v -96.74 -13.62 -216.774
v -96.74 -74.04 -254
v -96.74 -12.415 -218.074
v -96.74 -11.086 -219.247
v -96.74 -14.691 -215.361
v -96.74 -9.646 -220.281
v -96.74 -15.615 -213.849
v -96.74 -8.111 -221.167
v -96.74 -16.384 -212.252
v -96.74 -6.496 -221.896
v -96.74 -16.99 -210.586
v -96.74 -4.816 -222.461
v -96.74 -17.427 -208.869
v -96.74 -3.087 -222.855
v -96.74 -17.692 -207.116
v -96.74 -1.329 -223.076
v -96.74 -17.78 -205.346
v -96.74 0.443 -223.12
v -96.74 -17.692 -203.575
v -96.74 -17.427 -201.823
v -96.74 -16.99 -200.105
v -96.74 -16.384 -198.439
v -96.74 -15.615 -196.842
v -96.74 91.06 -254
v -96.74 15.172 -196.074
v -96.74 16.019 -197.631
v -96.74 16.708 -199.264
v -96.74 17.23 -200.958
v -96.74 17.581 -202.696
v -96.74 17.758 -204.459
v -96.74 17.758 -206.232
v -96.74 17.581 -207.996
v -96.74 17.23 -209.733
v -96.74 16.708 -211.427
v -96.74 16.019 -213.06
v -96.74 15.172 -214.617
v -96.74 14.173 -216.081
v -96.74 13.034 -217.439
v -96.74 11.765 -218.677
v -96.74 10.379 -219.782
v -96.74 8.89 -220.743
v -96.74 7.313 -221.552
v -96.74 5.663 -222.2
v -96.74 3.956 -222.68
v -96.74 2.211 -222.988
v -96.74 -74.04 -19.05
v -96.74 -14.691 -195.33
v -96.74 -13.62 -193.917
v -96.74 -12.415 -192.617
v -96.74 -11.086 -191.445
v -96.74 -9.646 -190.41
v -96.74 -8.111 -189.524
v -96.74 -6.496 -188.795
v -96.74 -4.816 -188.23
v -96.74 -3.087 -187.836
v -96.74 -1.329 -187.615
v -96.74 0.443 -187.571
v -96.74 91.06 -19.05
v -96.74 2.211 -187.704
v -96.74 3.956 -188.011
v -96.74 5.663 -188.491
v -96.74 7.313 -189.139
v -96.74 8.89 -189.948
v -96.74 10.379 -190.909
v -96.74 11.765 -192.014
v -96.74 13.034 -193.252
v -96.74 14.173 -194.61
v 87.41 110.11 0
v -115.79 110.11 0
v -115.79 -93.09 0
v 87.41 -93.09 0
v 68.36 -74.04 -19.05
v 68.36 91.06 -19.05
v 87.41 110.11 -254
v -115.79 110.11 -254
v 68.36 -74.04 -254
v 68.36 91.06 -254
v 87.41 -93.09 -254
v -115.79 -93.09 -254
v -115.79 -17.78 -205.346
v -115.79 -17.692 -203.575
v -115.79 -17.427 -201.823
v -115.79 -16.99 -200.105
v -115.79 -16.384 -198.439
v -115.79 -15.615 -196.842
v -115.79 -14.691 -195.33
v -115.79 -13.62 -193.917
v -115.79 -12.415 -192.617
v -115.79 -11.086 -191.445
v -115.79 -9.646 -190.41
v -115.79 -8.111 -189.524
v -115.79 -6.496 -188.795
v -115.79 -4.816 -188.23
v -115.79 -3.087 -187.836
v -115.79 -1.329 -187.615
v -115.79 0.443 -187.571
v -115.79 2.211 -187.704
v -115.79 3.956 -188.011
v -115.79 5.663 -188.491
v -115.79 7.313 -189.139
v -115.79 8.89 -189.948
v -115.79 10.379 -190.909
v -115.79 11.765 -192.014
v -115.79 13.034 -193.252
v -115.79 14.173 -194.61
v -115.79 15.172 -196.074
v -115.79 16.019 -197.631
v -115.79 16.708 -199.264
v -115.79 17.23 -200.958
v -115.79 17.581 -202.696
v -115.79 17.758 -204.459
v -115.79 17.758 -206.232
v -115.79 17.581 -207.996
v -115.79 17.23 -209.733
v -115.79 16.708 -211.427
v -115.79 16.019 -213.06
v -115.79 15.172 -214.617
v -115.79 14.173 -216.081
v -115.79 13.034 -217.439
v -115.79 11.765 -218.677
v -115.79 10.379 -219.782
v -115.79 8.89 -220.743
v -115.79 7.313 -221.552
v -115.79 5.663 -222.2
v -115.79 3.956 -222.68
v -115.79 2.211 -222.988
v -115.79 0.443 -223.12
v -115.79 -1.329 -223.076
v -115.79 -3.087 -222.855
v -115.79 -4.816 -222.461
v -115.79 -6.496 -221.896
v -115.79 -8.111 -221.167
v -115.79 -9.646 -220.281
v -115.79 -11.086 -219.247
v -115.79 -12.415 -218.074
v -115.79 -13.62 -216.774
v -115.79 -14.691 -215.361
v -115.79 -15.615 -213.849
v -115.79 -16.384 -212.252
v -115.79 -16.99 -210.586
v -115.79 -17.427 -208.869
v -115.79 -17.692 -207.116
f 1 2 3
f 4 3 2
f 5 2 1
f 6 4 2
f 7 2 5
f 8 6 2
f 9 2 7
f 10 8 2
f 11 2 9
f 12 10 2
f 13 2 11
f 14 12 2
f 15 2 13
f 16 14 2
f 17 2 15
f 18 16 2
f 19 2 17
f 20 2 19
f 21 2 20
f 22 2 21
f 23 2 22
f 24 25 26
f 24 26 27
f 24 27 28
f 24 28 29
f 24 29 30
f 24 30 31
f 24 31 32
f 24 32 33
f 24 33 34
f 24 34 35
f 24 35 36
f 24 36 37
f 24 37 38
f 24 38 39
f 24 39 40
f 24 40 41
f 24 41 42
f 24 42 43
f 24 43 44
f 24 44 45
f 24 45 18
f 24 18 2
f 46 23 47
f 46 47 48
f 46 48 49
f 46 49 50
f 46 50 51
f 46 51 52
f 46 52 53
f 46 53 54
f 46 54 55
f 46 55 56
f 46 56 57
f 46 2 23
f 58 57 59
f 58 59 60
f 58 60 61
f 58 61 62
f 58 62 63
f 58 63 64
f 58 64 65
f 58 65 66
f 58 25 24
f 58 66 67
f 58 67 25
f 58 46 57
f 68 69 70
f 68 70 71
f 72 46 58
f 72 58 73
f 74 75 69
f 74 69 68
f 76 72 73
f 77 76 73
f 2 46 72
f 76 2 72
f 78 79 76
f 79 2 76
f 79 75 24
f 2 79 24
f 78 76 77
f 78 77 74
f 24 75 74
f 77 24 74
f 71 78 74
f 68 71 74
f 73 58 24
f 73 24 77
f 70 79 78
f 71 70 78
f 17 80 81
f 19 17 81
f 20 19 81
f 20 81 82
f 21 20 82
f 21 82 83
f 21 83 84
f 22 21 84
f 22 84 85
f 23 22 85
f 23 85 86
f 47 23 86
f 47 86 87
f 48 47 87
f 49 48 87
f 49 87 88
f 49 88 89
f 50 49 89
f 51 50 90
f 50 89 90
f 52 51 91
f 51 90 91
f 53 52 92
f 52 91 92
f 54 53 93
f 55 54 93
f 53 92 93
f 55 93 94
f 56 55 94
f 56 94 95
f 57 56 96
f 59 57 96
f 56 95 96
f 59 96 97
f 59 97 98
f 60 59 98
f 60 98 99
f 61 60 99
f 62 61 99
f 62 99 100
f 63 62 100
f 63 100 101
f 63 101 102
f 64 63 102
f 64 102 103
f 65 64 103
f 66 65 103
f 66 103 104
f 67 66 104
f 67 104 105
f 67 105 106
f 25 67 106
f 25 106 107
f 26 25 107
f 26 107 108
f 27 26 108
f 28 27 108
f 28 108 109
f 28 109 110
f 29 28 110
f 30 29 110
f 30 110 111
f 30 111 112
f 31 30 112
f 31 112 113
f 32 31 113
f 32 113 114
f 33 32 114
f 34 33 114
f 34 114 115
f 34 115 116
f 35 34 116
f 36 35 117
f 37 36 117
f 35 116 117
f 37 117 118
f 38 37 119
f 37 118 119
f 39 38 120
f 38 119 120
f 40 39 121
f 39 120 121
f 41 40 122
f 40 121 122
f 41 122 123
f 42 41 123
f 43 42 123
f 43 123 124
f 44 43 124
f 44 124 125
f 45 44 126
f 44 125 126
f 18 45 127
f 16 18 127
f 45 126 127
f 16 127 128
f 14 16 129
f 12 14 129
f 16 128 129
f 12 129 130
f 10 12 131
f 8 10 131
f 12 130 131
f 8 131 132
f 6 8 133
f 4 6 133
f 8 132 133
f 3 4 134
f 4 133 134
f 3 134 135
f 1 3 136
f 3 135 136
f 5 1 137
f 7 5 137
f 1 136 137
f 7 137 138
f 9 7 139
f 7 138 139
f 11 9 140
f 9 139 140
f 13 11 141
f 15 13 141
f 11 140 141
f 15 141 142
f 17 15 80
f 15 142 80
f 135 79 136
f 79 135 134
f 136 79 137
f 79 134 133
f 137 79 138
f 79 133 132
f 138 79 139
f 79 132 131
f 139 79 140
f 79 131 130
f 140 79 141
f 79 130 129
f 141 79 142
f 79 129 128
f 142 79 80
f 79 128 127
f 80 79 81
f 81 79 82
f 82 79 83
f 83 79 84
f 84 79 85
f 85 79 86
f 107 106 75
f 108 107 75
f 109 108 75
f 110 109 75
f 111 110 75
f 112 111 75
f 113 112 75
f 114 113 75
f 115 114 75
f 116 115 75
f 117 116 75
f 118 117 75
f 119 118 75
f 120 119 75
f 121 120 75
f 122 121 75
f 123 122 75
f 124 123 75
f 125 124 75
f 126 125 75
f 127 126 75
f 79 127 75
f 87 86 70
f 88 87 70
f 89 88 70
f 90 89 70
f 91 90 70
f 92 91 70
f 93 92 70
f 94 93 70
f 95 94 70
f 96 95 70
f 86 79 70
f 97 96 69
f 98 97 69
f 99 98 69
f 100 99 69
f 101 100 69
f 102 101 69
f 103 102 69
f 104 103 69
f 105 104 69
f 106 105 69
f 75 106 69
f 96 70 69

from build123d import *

# Parameters (mm, degrees)
F0_W     = 203.2
F0_H     = 203.2
F0_W_2   = 165.1
F0_H_2   = 165.1
F1_DEPTH = 254
F2_DEPTH = 19.05
F3_R     = 17.78
F4_DEPTH = 25.4


with BuildPart() as f1:
    # F0 (on Top) → F1 (new body)
    with BuildSketch(Plane.XY):
        with Locations((-14.190134, 8.51027)):
            Rectangle(F0_W, F0_H)
        with Locations((-14.190134, 8.51027)):
            Rectangle(F0_W_2, F0_H_2, mode=Mode.SUBTRACT)
    extrude(amount=-F1_DEPTH)

    # F0 (on Top) → F2 (join)
    with BuildSketch(Plane.XY):
        with Locations((-14.190134, 8.51027)):
            Rectangle(F0_W_2, F0_H_2)
    extrude(amount=-F2_DEPTH)

    # F3 (on face) → F4 (cut)
    with BuildSketch(Plane(origin=(-115.790134, 0, 0), x_dir=(0, -1, 0), z_dir=(-1, 0, 0))):
        with Locations((0, -205.345541)):
            Circle(F3_R)
    extrude(amount=-F4_DEPTH, mode=Mode.SUBTRACT)


solid = f1.part
